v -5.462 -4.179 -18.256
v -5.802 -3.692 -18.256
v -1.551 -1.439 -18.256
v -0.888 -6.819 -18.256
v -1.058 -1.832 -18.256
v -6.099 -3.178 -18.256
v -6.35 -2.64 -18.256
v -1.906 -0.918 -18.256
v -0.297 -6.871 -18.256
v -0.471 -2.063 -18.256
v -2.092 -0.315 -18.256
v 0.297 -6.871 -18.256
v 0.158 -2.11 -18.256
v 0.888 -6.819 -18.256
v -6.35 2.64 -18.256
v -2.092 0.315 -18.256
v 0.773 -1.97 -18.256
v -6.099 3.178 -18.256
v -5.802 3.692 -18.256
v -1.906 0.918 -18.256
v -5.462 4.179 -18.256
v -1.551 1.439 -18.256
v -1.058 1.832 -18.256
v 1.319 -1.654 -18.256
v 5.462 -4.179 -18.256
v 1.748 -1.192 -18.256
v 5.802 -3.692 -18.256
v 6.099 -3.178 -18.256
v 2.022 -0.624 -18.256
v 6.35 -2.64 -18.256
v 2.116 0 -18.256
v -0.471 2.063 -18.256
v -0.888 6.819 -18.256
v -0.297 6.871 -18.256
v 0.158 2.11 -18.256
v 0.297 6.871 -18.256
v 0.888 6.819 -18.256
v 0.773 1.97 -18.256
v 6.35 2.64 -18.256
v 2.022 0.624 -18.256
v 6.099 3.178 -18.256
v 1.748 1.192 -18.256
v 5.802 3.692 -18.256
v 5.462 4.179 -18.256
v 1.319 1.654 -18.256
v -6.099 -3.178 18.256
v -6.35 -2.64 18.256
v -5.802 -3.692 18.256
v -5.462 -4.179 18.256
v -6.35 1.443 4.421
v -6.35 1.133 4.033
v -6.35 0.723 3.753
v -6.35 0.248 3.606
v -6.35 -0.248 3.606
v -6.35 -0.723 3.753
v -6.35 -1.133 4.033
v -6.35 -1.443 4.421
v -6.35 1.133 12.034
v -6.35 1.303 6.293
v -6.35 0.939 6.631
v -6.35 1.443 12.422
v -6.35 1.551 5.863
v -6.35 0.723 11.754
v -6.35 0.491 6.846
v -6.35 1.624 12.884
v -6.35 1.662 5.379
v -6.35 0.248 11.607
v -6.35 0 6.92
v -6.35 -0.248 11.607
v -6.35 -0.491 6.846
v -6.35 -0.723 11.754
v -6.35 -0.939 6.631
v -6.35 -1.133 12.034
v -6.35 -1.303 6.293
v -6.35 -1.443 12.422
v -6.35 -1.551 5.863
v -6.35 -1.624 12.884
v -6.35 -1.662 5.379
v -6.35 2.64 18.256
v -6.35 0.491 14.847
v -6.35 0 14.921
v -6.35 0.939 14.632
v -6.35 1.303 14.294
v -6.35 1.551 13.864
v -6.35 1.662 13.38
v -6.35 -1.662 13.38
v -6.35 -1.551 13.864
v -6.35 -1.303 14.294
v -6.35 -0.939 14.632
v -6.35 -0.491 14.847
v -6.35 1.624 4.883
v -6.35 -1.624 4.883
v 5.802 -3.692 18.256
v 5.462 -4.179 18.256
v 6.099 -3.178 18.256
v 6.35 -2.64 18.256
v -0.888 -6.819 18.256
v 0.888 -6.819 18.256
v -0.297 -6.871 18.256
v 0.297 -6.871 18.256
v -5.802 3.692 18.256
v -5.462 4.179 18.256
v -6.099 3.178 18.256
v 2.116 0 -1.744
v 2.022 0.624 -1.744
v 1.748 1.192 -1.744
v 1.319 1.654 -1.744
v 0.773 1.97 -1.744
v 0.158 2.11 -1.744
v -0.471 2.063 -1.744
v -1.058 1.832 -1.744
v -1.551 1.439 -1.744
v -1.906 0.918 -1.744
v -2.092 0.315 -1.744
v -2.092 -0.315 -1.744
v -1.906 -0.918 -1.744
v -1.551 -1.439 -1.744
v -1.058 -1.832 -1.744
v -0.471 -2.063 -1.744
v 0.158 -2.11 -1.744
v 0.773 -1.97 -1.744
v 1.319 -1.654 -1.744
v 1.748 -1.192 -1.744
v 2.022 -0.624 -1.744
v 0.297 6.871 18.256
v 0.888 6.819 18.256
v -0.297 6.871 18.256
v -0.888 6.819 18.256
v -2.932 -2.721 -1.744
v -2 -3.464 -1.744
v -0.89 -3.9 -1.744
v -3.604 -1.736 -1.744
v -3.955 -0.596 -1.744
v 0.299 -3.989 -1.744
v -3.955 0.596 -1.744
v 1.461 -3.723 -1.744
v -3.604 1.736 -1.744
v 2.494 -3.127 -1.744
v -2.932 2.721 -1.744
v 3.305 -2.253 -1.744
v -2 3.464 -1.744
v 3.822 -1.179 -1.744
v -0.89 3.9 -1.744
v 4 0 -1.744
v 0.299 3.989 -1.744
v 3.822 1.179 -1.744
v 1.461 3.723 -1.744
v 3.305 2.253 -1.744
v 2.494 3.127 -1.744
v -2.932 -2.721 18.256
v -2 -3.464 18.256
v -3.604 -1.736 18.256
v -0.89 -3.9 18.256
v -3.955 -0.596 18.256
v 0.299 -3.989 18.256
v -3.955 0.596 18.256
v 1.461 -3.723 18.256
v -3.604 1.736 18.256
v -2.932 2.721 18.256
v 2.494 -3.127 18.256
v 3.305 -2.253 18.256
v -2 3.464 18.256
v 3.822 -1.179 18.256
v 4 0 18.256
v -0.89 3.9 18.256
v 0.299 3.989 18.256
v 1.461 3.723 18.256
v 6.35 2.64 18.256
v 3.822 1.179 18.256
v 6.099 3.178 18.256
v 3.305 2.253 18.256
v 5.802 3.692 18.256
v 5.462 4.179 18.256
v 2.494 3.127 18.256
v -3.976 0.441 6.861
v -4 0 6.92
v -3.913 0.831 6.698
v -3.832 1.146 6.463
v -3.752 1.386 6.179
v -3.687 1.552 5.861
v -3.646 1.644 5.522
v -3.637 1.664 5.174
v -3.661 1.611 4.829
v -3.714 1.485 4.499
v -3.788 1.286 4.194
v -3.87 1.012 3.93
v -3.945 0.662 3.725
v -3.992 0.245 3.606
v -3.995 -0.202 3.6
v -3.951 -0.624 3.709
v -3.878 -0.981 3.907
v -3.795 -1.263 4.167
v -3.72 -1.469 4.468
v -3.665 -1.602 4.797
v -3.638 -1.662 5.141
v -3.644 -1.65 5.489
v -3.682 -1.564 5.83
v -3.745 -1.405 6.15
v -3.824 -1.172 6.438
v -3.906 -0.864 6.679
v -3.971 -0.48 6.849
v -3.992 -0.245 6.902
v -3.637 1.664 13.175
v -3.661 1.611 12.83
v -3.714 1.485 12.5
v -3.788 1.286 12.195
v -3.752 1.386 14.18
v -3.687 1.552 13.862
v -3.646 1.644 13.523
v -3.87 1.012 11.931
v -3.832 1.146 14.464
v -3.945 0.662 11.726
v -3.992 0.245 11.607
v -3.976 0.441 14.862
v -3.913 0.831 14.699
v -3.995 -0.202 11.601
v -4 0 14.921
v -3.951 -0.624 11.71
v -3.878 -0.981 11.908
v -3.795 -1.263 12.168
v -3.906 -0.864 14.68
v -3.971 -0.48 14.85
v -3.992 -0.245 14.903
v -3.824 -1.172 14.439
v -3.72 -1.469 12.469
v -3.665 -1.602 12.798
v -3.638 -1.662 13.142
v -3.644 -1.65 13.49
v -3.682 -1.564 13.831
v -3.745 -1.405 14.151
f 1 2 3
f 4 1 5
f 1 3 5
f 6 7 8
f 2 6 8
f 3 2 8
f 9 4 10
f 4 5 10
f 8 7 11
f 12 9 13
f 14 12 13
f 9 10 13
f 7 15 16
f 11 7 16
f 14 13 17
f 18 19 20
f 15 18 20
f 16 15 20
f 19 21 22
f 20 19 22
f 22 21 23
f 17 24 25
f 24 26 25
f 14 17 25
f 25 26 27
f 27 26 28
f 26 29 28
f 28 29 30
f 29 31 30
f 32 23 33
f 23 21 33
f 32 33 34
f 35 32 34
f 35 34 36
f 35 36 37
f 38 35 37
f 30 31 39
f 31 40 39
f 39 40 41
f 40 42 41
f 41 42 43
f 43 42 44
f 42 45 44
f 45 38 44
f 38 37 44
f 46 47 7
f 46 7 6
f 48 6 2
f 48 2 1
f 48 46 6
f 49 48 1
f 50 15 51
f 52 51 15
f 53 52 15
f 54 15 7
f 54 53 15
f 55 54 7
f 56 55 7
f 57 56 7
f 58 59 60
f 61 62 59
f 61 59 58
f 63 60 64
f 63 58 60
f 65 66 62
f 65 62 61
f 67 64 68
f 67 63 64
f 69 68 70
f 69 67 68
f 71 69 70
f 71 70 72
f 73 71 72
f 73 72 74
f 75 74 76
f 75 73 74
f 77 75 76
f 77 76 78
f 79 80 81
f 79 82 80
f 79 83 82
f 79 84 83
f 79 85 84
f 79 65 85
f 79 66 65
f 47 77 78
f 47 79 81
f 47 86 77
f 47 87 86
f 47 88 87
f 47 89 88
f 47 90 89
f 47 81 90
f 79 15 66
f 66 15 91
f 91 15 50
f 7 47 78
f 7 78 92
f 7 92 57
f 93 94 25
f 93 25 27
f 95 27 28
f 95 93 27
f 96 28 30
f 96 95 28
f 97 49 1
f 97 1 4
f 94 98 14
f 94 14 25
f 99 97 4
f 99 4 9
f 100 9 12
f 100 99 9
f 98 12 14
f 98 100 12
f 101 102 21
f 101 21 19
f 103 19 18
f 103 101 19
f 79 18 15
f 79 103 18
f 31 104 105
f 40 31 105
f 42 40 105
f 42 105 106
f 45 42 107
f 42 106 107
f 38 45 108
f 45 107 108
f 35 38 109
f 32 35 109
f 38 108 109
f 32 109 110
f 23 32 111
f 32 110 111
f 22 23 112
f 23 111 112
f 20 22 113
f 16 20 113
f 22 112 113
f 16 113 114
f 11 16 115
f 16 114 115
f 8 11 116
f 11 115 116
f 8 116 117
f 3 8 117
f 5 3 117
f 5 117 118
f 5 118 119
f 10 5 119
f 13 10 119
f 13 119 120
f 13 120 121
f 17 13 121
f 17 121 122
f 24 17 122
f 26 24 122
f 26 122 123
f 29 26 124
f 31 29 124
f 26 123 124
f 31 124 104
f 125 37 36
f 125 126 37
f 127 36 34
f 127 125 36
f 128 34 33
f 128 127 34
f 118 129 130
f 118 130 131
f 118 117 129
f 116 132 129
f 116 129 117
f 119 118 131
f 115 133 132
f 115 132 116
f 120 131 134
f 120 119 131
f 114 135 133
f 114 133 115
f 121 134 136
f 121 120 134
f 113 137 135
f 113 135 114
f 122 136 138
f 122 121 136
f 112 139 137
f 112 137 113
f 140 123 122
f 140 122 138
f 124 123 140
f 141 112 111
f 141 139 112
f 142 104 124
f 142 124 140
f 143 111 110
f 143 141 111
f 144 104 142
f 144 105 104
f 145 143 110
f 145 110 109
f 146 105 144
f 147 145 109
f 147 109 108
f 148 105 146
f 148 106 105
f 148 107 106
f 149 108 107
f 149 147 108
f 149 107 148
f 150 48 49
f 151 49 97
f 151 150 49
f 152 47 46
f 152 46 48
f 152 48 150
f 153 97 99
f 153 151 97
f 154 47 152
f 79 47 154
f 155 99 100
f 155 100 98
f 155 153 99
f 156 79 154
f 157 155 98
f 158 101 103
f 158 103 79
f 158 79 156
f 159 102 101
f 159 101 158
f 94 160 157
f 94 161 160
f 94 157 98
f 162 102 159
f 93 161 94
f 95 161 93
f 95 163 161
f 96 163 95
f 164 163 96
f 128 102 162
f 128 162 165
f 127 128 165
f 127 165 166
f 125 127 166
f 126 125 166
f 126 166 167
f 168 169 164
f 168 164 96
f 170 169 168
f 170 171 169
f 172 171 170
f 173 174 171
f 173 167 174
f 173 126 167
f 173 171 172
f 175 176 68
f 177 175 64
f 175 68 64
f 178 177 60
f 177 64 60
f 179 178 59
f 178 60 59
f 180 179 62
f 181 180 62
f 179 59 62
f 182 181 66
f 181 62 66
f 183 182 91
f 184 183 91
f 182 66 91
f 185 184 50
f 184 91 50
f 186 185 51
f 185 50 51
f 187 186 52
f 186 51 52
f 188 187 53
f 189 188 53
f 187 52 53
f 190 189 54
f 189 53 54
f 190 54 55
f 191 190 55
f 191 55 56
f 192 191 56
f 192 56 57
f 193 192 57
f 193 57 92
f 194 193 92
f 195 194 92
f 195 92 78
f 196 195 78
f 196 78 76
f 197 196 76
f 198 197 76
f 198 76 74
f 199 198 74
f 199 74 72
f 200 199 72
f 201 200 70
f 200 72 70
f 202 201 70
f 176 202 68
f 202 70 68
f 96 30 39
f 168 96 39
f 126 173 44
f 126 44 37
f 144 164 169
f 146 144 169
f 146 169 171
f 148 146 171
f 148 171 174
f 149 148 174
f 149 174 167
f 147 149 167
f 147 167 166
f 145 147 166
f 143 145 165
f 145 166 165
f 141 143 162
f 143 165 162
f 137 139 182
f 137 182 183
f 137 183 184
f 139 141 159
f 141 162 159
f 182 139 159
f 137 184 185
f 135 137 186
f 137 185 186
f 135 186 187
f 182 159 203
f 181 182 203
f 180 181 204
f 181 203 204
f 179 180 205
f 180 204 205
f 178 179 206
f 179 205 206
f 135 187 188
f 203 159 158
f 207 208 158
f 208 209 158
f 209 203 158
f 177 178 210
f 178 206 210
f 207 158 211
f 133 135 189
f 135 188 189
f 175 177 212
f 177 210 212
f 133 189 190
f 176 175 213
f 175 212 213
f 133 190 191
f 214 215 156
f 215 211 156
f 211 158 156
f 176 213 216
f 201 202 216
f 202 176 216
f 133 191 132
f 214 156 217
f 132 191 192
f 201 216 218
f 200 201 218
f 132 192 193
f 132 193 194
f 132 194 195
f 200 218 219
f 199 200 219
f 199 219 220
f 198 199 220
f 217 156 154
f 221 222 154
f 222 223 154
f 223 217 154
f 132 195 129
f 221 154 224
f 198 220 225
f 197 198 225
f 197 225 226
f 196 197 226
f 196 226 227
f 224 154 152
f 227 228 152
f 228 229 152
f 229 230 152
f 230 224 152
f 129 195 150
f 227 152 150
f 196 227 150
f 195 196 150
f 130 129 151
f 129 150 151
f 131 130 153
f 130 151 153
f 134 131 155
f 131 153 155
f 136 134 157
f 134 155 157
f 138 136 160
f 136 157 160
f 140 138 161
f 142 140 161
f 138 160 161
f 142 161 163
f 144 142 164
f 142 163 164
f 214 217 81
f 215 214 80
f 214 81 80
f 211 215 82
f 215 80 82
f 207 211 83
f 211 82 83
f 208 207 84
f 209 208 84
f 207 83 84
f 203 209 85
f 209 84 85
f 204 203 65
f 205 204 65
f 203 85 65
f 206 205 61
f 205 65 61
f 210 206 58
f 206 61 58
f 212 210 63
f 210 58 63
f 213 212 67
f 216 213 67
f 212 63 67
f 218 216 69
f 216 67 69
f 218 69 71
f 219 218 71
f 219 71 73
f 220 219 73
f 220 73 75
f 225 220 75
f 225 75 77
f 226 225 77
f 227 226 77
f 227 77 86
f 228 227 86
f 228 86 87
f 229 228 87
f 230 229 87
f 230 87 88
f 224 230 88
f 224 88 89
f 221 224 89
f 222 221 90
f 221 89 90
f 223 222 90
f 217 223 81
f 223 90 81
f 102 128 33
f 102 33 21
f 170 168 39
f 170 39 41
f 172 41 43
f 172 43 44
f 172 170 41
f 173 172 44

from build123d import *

# Parameters (mm, degrees)
SKETCH1_R               = 6.35
BASIC_ROD_DEPTH         = 18.25625
BASIC_ROD_DEPTH_BACK    = 18.25625
THEX_DEPTH              = 18.25625
SKETCH2_R               = 2.11582
INTERNAL_CUT_DEPTH      = 19.25625
INTERNAL_CUT_DEPTH_BACK = 19.25625
SKETCH9_R               = 4
CUT_EXTRUDE1_DEPTH      = 19.99996
CUT_EXTRUDE2_REACH      = 14.7
SKETCH10_R              = 1.66624


with BuildPart() as part:
    # Sketch1 → Basic Rod (new body, two sides)
    with BuildSketch(Plane.XY) as basic_rod_sk:
        Circle(SKETCH1_R)
    extrude(amount=BASIC_ROD_DEPTH)
    extrude(basic_rod_sk.sketch, amount=-BASIC_ROD_DEPTH_BACK)

    # Sketch8 → THex (add, symmetric)
    with BuildSketch(Plane.XY):
        with BuildLine():
            Line((-0.888411378, 6.819423871), (-5.461588622, 4.179098758))
            ThreePointArc((-5.461588622, 4.179098758), (-5.955700003, 3.438525), (-6.35, 2.640325113))
            Line((-6.35, 2.640325113), (-6.35, -2.640325113))
            ThreePointArc((-6.35, -2.640325113), (-5.955700003, -3.438525), (-5.461588622, -4.179098758))
            Line((-5.461588622, -4.179098758), (-0.888411378, -6.819423871))
            ThreePointArc((-0.888411378, -6.819423871), (0, -6.87705), (0.888411378, -6.819423871))
            Line((0.888411378, -6.819423871), (5.461588622, -4.179098758))
            ThreePointArc((5.461588622, -4.179098758), (5.955700003, -3.438525), (6.35, -2.640325113))
            Line((6.35, -2.640325113), (6.35, 2.640325113))
            ThreePointArc((6.35, 2.640325113), (5.955700003, 3.438525), (5.461588622, 4.179098758))
            Line((5.461588622, 4.179098758), (0.888411378, 6.819423871))
            ThreePointArc((0.888411378, 6.819423871), (0, 6.87705), (-0.888411378, 6.819423871))
        make_face()
    extrude(amount=THEX_DEPTH, both=True)

    # Sketch2 → Internal Cut (cut, two sides)
    with BuildSketch(Plane.XY) as internal_cut_sk:
        Circle(SKETCH2_R)
    extrude(amount=INTERNAL_CUT_DEPTH, mode=Mode.SUBTRACT)
    extrude(internal_cut_sk.sketch, amount=-INTERNAL_CUT_DEPTH_BACK, mode=Mode.SUBTRACT)

    # Sketch9 → Cut-Extrude1 (cut)
    with BuildSketch(Plane.XY.offset(18.25625)):
        Circle(SKETCH9_R)
    extrude(amount=-CUT_EXTRUDE1_DEPTH, mode=Mode.SUBTRACT)

    # Sketch10 → Cut-Extrude2 (cut, up to next)
    with BuildSketch(Plane.ZY.offset(6.35), mode=Mode.PRIVATE) as cut_extrude2_sk1:
        with Locations((5.25399, 0)):
            Circle(SKETCH10_R)
    cut_extrude2_tool1 = extrude(cut_extrude2_sk1.sketch, amount=-CUT_EXTRUDE2_REACH, mode=Mode.PRIVATE) & part.part
    add(cut_extrude2_tool1.solids().sort_by_distance((-6.35, 0, 5.25399))[0], mode=Mode.SUBTRACT)
    # Sketch10 → Cut-Extrude2 (cut, up to next)
    with BuildSketch(Plane.ZY.offset(6.35), mode=Mode.PRIVATE) as cut_extrude2_sk2:
        with Locations((13.25499, 0)):
            Circle(SKETCH10_R)
    cut_extrude2_tool2 = extrude(cut_extrude2_sk2.sketch, amount=-CUT_EXTRUDE2_REACH, mode=Mode.PRIVATE) & part.part
    add(cut_extrude2_tool2.solids().sort_by_distance((-6.35, 0, 13.25499))[0], mode=Mode.SUBTRACT)


solid = part.part
